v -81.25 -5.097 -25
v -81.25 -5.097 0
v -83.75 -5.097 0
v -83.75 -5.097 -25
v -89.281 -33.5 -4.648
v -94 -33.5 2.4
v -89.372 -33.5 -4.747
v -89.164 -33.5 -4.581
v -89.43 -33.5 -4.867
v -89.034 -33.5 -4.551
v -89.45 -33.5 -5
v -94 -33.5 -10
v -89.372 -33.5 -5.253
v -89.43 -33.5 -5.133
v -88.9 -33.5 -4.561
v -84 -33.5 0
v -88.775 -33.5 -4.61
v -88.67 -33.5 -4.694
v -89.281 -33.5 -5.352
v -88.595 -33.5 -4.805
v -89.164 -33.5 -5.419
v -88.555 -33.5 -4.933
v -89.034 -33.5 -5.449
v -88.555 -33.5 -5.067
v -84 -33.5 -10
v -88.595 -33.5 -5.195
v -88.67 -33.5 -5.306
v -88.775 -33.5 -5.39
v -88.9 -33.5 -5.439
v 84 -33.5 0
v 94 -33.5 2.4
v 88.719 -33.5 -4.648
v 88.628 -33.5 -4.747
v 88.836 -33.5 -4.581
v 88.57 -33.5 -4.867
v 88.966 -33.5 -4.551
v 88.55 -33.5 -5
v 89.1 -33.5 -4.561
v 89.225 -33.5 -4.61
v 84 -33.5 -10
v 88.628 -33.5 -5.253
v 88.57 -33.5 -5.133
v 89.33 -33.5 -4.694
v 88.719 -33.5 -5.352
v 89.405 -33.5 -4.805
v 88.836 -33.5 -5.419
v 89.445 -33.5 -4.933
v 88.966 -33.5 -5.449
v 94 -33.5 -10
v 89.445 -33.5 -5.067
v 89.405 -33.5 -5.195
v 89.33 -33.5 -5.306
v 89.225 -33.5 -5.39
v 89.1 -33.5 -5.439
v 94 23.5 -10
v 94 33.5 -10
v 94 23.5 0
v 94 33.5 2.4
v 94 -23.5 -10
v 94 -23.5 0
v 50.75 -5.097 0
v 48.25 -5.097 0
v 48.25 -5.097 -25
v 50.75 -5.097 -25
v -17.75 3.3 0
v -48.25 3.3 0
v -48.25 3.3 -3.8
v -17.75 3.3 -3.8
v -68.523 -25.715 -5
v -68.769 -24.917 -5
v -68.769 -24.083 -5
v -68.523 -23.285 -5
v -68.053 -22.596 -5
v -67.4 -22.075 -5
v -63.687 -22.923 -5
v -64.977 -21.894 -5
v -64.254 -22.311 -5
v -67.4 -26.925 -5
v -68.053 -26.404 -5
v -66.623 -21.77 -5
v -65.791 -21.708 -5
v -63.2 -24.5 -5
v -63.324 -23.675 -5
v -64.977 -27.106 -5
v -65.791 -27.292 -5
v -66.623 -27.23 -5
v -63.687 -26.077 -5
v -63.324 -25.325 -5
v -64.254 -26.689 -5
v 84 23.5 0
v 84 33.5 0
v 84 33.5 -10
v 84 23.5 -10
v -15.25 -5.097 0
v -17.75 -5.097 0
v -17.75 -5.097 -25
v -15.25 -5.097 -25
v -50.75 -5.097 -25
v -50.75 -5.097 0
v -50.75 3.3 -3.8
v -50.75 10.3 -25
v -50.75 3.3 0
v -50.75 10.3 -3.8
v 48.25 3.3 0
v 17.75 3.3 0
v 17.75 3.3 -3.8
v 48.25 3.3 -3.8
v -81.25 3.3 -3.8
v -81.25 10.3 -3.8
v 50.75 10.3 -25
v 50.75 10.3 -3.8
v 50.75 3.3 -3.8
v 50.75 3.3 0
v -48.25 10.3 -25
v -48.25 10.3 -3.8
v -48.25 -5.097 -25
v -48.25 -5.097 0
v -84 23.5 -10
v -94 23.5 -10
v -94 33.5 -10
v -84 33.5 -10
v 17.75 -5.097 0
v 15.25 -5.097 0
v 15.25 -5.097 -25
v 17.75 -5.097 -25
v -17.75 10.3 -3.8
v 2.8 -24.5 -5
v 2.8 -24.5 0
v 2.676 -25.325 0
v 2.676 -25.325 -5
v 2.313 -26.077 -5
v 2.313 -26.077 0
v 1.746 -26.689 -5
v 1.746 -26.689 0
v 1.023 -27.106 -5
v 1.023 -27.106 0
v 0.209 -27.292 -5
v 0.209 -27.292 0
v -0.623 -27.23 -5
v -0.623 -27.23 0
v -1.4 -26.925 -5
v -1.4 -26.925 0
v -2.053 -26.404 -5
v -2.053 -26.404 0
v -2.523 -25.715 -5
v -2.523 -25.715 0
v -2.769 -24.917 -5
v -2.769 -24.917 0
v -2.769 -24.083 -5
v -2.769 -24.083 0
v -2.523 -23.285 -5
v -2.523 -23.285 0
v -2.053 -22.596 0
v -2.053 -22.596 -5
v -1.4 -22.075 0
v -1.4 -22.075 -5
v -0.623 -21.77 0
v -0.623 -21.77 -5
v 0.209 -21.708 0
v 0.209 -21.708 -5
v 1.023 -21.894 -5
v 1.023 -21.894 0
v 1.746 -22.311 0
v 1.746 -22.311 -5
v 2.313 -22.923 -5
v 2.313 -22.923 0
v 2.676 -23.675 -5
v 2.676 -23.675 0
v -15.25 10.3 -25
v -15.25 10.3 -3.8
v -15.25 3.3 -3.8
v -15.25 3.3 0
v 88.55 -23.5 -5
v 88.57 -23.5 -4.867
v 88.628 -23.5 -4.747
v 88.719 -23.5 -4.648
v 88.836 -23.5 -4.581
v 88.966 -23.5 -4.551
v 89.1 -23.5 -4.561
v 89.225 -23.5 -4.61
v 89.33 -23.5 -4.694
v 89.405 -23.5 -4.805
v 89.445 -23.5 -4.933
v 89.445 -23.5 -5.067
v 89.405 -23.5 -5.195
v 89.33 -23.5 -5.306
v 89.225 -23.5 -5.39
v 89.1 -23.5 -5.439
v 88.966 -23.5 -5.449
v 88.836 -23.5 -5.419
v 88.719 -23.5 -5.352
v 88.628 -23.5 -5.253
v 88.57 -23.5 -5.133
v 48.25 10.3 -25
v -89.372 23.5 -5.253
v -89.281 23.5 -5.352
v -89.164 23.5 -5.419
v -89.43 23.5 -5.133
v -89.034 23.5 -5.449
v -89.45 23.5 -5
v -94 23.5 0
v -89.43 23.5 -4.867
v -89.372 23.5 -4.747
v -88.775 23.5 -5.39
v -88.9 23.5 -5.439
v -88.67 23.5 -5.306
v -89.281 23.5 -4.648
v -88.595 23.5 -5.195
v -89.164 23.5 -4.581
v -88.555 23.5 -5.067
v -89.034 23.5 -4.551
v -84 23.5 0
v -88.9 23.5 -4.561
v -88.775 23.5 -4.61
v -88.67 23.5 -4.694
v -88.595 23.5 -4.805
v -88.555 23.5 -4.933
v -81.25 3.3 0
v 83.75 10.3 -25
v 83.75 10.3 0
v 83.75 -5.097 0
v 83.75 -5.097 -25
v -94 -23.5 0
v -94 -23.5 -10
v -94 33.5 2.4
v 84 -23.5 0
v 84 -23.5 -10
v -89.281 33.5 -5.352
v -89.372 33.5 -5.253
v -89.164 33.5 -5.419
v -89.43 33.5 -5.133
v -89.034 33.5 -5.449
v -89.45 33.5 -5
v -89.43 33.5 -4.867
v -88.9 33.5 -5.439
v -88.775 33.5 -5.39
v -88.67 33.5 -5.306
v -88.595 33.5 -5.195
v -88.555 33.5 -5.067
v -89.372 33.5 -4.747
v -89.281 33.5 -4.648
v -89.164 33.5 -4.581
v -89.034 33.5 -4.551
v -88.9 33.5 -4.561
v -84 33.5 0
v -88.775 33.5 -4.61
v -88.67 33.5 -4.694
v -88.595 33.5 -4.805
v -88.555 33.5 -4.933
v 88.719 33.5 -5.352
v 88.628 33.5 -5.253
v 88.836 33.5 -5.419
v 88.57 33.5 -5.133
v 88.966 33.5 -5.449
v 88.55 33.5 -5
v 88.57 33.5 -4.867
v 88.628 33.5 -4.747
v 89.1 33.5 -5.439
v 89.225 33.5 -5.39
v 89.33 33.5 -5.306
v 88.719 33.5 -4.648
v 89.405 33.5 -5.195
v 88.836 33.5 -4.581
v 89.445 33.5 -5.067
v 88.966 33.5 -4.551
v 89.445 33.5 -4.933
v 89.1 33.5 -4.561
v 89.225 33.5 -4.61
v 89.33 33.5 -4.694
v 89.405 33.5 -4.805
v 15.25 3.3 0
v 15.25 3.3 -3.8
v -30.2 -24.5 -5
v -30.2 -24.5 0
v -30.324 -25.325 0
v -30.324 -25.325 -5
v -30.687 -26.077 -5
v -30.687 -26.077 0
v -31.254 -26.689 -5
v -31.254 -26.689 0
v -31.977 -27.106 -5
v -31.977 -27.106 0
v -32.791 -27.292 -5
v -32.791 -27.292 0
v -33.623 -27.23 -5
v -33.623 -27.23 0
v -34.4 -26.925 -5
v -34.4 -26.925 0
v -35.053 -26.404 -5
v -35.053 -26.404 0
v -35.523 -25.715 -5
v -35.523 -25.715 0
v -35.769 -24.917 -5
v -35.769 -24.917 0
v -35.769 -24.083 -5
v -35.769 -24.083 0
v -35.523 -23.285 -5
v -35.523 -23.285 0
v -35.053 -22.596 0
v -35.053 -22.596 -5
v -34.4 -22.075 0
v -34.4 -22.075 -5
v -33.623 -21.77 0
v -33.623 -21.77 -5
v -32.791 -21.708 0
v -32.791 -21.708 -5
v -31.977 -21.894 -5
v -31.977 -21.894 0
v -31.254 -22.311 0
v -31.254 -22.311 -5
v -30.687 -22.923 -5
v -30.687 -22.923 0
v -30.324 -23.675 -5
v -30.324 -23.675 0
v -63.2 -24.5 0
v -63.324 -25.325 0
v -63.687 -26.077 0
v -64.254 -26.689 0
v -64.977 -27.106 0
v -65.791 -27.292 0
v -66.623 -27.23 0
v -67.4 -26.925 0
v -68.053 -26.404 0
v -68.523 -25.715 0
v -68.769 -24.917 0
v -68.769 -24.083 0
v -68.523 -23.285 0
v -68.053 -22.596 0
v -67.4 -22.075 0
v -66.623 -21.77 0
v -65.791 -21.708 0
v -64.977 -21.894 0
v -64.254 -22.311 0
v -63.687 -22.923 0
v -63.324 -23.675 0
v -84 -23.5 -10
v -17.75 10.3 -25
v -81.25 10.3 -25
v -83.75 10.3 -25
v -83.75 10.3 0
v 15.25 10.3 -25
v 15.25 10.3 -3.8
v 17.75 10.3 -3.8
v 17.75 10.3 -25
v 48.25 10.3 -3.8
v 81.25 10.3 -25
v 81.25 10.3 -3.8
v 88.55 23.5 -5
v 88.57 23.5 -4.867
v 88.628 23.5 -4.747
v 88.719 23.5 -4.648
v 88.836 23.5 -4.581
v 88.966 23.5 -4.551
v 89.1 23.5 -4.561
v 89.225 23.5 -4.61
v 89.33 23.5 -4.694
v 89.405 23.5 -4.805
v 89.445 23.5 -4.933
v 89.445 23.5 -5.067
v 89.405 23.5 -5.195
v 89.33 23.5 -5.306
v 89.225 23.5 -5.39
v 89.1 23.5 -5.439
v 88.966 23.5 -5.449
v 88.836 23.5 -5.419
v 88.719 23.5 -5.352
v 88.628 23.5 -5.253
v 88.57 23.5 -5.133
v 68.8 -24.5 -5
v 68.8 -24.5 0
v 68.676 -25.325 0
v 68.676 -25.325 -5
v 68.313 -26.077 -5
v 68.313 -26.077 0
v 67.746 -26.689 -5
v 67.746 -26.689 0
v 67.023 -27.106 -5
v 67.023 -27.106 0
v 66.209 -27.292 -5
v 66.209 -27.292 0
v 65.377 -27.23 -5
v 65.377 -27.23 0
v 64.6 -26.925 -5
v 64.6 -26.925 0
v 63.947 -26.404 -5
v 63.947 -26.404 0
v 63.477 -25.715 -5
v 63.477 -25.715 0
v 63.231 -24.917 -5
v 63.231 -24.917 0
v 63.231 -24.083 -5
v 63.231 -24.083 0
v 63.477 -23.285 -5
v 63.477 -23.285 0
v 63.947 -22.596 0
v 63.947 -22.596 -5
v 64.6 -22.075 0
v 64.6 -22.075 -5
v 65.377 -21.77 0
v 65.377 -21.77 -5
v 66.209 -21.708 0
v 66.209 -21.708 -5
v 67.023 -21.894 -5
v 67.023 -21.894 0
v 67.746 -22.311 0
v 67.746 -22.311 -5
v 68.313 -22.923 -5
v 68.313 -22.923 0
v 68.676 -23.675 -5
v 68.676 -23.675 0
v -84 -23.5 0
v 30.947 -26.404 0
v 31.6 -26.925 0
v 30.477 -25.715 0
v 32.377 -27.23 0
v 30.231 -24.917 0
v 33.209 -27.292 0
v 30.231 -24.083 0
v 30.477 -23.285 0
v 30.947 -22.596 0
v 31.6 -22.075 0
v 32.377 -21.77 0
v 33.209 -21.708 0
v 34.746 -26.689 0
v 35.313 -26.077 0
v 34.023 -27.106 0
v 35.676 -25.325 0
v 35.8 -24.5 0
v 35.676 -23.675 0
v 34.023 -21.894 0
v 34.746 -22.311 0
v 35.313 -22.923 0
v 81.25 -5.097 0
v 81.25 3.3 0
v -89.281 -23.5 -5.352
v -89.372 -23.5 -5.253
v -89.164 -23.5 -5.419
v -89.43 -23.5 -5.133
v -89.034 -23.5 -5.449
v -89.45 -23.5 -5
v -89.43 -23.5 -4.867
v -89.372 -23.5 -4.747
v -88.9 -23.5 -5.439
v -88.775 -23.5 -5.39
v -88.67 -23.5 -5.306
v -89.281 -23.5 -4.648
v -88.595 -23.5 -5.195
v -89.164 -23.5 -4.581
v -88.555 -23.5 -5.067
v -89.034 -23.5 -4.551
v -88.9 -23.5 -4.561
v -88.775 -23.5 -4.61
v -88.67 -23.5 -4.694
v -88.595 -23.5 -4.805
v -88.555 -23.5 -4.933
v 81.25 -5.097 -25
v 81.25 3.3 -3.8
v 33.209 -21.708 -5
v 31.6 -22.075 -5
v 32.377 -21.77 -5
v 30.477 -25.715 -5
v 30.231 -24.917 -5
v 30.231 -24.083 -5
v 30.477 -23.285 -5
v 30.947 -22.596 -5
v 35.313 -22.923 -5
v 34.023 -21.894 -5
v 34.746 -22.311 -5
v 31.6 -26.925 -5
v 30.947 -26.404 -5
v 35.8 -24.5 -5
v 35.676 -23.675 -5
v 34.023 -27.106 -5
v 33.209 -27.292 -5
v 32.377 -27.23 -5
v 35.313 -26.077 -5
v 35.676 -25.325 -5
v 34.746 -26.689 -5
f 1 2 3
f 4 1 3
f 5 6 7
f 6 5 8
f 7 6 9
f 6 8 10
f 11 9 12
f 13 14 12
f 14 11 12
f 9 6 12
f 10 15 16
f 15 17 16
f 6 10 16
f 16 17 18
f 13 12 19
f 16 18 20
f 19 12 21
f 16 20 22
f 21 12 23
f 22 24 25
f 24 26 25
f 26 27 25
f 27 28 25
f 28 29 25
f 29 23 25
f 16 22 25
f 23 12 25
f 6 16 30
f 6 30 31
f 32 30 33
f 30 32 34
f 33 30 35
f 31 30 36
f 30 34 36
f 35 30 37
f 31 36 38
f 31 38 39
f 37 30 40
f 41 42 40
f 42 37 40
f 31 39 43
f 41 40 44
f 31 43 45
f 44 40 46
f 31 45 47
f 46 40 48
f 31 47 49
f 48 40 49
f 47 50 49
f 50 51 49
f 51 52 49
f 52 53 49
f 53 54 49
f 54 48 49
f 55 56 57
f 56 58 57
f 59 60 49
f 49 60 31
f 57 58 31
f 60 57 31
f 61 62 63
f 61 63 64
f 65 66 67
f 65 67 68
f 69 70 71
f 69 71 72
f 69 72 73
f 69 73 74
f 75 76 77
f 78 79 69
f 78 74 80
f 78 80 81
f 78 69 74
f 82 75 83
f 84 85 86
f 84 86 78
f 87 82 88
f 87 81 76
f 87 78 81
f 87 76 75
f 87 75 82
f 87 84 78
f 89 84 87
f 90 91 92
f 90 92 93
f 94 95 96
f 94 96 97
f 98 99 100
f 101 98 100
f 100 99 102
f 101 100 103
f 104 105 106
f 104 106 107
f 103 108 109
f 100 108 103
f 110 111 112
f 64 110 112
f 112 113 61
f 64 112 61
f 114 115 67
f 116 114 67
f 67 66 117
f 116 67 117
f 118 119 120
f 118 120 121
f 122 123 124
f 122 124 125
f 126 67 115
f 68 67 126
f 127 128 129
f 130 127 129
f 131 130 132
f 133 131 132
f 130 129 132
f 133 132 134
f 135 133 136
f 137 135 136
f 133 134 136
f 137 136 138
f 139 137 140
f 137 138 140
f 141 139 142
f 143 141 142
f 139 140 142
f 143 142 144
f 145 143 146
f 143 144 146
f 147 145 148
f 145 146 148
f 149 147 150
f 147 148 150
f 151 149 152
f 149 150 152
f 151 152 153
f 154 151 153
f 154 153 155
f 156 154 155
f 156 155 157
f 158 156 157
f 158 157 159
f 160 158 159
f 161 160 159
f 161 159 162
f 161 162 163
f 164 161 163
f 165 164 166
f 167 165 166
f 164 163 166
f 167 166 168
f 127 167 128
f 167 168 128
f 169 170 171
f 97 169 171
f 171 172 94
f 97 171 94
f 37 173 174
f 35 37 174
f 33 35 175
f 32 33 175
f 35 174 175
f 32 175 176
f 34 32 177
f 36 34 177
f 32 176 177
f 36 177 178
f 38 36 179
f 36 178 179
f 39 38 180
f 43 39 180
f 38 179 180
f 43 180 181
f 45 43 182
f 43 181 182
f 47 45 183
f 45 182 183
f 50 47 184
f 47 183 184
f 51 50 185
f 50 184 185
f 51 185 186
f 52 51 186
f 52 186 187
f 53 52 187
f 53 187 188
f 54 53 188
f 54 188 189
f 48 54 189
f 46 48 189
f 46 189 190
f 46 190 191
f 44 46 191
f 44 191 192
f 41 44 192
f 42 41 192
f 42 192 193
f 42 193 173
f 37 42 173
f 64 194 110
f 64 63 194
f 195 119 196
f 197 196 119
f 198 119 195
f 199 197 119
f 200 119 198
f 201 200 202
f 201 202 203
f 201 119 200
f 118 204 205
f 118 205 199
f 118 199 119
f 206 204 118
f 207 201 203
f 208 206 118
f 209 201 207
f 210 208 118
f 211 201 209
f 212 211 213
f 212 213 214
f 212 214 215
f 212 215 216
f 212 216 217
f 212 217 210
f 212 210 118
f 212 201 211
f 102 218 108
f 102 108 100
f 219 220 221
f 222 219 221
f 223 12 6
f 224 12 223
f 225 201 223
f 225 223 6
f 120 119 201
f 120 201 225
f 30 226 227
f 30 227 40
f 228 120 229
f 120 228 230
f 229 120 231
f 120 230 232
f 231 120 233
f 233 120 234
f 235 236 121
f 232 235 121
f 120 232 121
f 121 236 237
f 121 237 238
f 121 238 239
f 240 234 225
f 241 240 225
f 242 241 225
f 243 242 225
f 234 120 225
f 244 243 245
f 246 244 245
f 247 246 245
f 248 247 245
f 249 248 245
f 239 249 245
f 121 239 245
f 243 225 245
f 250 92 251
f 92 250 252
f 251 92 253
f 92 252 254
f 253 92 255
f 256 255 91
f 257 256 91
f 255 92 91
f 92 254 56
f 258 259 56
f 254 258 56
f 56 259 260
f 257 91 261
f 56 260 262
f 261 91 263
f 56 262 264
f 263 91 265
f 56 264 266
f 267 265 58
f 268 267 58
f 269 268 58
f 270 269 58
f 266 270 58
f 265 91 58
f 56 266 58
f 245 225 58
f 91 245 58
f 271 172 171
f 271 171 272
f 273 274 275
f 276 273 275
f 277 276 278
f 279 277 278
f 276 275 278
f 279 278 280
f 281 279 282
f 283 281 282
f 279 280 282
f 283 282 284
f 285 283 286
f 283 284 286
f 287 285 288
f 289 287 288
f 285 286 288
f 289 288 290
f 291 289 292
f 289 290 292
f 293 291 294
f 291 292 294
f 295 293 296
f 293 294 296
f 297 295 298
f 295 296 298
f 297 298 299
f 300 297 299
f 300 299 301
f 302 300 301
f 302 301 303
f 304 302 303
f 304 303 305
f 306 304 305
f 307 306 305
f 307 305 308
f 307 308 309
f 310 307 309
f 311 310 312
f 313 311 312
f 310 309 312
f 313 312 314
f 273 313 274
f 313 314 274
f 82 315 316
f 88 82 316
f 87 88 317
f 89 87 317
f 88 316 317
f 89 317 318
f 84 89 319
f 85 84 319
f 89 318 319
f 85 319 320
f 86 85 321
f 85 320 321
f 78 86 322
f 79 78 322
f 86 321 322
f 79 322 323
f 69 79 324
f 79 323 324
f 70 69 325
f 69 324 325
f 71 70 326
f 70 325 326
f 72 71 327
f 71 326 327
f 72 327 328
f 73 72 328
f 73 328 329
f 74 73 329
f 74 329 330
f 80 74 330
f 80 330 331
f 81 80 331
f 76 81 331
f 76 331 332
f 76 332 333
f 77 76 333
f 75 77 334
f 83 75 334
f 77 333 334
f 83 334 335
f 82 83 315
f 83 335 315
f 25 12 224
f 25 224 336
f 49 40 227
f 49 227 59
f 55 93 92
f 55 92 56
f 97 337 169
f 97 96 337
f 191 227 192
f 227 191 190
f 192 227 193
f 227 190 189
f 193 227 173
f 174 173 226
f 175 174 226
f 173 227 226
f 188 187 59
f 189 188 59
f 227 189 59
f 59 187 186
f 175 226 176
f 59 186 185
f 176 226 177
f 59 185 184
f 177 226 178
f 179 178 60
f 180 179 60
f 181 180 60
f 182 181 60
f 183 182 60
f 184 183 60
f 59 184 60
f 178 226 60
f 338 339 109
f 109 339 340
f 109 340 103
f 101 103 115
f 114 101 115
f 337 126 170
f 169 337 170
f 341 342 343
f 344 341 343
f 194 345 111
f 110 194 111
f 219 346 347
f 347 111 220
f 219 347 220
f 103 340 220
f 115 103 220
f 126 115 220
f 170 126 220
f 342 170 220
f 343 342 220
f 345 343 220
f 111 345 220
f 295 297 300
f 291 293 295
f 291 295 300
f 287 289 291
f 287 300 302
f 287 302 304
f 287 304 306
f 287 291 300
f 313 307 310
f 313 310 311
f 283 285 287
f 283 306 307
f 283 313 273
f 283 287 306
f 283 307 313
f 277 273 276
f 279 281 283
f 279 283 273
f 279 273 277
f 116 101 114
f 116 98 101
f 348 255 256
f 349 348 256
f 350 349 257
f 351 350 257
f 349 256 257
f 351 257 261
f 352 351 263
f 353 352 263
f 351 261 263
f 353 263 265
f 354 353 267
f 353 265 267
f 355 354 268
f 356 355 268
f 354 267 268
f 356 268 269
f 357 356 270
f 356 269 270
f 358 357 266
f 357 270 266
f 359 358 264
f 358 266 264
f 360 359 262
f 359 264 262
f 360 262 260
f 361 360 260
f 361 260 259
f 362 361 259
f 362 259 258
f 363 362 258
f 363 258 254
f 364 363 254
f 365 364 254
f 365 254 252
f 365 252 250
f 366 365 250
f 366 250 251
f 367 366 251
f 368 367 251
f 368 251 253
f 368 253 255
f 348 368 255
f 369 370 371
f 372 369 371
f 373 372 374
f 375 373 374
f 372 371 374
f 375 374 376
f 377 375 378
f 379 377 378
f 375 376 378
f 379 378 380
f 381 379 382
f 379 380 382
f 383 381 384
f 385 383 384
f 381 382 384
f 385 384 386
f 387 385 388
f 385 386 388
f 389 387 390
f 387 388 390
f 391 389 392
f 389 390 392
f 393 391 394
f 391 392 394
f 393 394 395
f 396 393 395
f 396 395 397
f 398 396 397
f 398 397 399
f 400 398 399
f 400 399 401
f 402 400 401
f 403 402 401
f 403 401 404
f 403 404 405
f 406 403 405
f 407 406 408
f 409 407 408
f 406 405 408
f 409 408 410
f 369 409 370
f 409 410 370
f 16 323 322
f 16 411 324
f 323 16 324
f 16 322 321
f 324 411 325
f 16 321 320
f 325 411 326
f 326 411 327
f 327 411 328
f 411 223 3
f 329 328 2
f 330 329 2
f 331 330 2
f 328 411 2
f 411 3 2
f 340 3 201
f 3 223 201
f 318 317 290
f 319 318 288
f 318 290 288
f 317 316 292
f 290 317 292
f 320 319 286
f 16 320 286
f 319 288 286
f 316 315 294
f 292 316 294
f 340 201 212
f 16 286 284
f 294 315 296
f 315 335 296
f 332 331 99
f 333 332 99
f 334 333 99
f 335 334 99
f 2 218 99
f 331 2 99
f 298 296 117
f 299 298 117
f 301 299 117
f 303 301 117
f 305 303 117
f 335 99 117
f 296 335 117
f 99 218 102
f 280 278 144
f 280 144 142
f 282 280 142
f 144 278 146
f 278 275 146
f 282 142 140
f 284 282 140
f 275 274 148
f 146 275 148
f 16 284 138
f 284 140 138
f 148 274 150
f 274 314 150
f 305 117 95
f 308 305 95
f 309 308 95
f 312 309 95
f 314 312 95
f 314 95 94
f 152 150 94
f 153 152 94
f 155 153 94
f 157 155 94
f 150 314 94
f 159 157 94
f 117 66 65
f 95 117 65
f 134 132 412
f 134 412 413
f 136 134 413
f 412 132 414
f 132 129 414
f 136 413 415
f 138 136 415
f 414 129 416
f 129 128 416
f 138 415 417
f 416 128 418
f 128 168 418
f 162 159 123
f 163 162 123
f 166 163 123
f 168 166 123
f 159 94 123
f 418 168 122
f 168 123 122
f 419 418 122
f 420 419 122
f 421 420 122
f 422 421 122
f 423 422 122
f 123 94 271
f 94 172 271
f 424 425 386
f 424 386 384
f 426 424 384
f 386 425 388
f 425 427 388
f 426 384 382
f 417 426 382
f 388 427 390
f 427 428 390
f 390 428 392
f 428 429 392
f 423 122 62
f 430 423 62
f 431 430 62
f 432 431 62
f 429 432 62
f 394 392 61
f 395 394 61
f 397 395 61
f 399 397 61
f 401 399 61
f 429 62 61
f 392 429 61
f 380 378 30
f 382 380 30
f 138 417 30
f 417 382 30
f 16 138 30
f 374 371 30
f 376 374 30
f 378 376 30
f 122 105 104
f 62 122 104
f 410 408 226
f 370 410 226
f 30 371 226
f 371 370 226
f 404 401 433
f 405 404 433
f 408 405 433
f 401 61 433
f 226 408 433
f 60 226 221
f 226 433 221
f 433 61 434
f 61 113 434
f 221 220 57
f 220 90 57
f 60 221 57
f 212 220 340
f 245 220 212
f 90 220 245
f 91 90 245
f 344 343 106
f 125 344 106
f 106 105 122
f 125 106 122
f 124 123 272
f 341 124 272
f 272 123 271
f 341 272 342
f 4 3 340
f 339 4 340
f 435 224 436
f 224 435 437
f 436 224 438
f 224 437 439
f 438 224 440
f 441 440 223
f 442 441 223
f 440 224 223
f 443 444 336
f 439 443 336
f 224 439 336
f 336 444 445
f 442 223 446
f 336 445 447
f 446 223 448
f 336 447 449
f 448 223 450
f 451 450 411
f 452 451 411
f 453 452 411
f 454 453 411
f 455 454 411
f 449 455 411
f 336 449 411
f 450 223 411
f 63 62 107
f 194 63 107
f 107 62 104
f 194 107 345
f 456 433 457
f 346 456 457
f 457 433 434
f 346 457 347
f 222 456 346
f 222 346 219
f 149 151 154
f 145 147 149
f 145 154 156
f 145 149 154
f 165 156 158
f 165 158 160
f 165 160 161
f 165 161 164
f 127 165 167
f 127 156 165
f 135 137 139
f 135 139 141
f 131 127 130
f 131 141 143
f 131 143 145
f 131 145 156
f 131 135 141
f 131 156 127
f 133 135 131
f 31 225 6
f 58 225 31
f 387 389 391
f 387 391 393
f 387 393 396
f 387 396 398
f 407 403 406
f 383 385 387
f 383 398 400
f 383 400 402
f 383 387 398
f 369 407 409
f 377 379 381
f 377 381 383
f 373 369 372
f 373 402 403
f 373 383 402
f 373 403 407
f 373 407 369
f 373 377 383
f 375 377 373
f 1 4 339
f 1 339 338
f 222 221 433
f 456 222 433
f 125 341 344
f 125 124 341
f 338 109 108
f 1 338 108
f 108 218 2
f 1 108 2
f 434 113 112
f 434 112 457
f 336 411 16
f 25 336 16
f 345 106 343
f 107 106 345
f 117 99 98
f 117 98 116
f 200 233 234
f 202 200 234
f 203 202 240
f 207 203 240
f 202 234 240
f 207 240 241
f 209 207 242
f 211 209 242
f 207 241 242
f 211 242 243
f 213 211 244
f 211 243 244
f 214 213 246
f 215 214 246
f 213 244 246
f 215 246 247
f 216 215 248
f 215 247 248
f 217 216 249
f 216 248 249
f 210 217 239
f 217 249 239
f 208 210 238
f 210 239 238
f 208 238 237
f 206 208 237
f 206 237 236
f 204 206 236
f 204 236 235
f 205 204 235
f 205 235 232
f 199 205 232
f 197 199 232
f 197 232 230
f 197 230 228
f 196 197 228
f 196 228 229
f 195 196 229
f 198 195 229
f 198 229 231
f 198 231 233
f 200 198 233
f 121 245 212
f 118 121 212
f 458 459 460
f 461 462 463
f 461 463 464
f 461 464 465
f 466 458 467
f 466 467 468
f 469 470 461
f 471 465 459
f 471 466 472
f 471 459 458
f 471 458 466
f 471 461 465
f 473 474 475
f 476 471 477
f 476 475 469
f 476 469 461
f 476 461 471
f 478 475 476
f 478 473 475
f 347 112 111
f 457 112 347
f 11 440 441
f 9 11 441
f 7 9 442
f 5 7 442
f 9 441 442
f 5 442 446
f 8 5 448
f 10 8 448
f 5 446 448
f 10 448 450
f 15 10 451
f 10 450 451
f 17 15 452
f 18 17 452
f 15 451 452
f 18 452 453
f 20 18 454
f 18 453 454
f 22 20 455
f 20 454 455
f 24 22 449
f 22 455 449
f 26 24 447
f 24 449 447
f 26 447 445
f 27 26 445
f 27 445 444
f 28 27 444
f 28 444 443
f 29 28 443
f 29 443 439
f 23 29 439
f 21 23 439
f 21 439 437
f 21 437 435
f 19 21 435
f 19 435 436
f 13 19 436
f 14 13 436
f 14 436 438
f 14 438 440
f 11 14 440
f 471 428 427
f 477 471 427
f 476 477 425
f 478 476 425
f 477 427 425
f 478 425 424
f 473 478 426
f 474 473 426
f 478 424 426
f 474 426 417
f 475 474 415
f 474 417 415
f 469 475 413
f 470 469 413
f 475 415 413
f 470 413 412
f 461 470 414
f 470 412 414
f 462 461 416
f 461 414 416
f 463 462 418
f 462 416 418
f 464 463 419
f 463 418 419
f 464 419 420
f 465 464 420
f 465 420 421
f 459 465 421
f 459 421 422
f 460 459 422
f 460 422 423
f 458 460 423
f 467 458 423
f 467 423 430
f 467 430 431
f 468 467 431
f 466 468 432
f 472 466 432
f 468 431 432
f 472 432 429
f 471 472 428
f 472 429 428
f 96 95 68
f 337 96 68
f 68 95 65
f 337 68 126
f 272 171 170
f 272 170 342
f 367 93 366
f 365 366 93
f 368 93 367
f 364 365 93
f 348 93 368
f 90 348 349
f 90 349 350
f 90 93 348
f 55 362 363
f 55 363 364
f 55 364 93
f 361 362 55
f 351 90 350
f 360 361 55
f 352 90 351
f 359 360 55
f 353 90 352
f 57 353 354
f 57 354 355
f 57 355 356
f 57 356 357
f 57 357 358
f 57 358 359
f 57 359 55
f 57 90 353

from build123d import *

# Parameters (mm, degrees)
F0_W     = 188
F0_H     = 67
F1_DEPTH = 2.4
F2_R     = 2.8
F3_DEPTH = 5
F2_W     = 10
F2_H     = 10
F4_DEPTH = 10
F2_W_2   = 2.5
F2_H_2   = 7
F2_W_3   = 1.2939542532
F2_W_4   = 1.2059563398
F2_H_3   = 8.3965584815
F2_W_5   = 1.2060457468
F2_W_6   = 1.2940436602
F5_DEPTH = 25
F2_W_7   = 30.5
F6_DEPTH = 3.8
F7_R     = 0.45
F8_DEPTH = 67.001


with BuildPart() as f1:
    # F0 (on Top) → F1 (new body)
    with BuildSketch(Plane.XY):
        Rectangle(F0_W, F0_H)
    extrude(amount=F1_DEPTH)

    # F2 (on face) → F3 (join)
    with BuildSketch(Plane(origin=(0, 0, 0), x_dir=(1, 0, 0), z_dir=(0, 0, -1))):
        with Locations((66, 24.5)):
            Circle(F2_R)
        with Locations((33, 24.5)):
            Circle(F2_R)
        with Locations((0, 24.5)):
            Circle(F2_R)
        with Locations((-33, 24.5)):
            Circle(F2_R)
        with Locations((-66, 24.5)):
            Circle(F2_R)
    extrude(amount=F3_DEPTH)

    # F2 (on face) → F4 (join)
    with BuildSketch(Plane(origin=(0, 0, 0), x_dir=(1, 0, 0), z_dir=(0, 0, -1))):
        with Locations((89, -28.5)):
            Rectangle(F2_W, F2_H)
        with Locations((89, 28.5)):
            Rectangle(F2_W, F2_H)
        with Locations((-89, -28.5)):
            Rectangle(F2_W, F2_H)
        with Locations((-89, 28.5)):
            Rectangle(F2_W, F2_H)
    extrude(amount=F4_DEPTH)

    # F2 (on face) → F5 (join)
    with BuildSketch(Plane(origin=(0, 0, 0), x_dir=(1, 0, 0), z_dir=(0, 0, -1))):
        with Locations((-49.5, -6.8)):
            Rectangle(F2_W_2, F2_H_2)
        with Locations((-16.5, -6.8)):
            Rectangle(F2_W_2, F2_H_2)
        with Locations((16.5, -6.8)):
            Rectangle(F2_W_2, F2_H_2)
        with Locations((49.5, -6.8)):
            Rectangle(F2_W_2, F2_H_2)
        with Locations((-81.8969771266, -6.8)):
            Rectangle(F2_W_3, F2_H_2)
        with Locations((83.1470218301, -6.8)):
            Rectangle(F2_W_4, F2_H_2)
        Polygon((-82.5439542532, -3.3), (-81.25, -3.3), (-81.25, 5.0965584815), (-83.75, 5.0965584815), (-83.75, -3.3), align=None)
        with Locations((-49.5, 0.8982792407)):
            Rectangle(F2_W_2, F2_H_3)
        with Locations((-16.5, 0.8982792407)):
            Rectangle(F2_W_2, F2_H_3)
        with Locations((16.5, 0.8982792407)):
            Rectangle(F2_W_2, F2_H_3)
        with Locations((49.5, 0.8982792407)):
            Rectangle(F2_W_2, F2_H_3)
        Polygon((82.5440436602, -3.3), (83.75, -3.3), (83.75, 5.0965584815), (81.25, 5.0965584815), (81.25, -3.3), align=None)
        with Locations((-83.1469771266, -6.8)):
            Rectangle(F2_W_5, F2_H_2)
        with Locations((81.8970218301, -6.8)):
            Rectangle(F2_W_6, F2_H_2)
    extrude(amount=F5_DEPTH)

    # F2 (on face) → F6 (join)
    with BuildSketch(Plane(origin=(0, 0, 0), x_dir=(1, 0, 0), z_dir=(0, 0, -1))):
        with Locations((66, -6.8)):
            Rectangle(F2_W_7, F2_H_2)
        with Locations((33, -6.8)):
            Rectangle(F2_W_7, F2_H_2)
        with Locations((0, -6.8)):
            Rectangle(F2_W_7, F2_H_2)
        with Locations((-33, -6.8)):
            Rectangle(F2_W_7, F2_H_2)
        with Locations((-66, -6.8)):
            Rectangle(F2_W_7, F2_H_2)
    extrude(amount=F6_DEPTH)

    # F7 (on face) → F8 (cut, through all)
    with BuildSketch(Plane(origin=(0, 33.5, 0), x_dir=(-1, 0, 0), z_dir=(0, 1, 0))):
        with Locations((89, -5)):
            Circle(F7_R)
        with Locations((-89, -5)):
            Circle(F7_R)
    extrude(amount=-F8_DEPTH, mode=Mode.SUBTRACT)


solid = f1.part
